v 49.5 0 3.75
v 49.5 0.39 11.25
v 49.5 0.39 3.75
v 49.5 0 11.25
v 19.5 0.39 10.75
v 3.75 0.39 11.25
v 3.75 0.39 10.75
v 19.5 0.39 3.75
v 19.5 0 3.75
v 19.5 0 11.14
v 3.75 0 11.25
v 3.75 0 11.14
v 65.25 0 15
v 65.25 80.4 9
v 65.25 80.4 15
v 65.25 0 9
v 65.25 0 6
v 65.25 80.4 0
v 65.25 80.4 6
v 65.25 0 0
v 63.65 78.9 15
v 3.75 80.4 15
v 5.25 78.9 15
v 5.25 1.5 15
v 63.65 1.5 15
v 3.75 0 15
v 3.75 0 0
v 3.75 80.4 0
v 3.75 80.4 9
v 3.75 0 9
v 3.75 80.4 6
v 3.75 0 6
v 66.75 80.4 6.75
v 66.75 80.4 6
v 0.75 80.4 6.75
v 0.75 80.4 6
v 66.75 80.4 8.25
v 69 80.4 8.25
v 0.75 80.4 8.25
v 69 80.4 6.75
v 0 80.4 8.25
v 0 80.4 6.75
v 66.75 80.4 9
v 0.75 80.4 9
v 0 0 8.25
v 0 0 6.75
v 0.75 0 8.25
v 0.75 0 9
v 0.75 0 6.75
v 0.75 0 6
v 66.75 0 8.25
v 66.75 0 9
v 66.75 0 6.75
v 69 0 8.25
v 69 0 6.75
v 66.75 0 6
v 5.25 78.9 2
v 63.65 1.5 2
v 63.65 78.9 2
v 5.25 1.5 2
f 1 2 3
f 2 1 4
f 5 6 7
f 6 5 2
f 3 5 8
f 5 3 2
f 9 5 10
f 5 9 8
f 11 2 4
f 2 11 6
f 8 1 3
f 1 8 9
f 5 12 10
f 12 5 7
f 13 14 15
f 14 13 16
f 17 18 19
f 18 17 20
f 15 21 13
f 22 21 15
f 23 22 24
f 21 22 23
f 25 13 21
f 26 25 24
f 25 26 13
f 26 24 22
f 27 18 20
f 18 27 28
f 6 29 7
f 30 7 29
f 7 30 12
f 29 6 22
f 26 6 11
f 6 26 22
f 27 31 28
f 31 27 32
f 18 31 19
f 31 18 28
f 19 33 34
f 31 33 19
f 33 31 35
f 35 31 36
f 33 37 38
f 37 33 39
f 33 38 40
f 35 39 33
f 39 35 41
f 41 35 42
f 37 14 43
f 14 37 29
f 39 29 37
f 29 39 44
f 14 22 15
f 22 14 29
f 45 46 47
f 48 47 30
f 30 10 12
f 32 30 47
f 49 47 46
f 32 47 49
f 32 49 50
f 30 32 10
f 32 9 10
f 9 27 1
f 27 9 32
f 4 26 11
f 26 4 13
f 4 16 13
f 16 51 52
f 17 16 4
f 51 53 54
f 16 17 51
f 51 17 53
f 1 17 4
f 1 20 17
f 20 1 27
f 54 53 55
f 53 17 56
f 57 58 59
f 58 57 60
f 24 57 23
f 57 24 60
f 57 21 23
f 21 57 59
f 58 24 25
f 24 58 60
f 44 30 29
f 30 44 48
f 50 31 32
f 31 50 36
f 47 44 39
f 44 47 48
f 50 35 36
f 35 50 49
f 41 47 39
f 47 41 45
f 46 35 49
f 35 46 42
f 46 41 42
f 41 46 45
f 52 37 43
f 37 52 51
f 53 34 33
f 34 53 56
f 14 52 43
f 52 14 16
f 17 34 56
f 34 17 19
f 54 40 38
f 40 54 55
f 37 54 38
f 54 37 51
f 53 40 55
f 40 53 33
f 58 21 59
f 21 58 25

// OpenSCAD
// file: libs/microscope-slide-hyperobject/slide.scad
// ----------------------------------------------------
// Material Hyperobject Compensations
// (Passed dynamically by the Commons API)
// ----------------------------------------------------
mat_shrinkage_x = 1.0;
mat_shrinkage_y = 1.0;
mat_shrinkage_z = 1.0;

mat_clear_press = 0.0;
mat_clear_slide = 0.0;
mat_clear_loose = 0.0;

// Standard Microscope Slide Dimensions (ISO 8037)
function slide_slot_width(thickness, tolerance) = thickness + tolerance + mat_clear_slide + 0.1;
function slide_pitch(slot_w, rib_w) = slot_w + rib_w;

module slide_retention_rib(height, depth, root_w, tip_w, chamfer_h) {
  // ONE polyhedron, not a cube unioned with a chamfer cap.
  //
  // The rib used to be `cube([root_w, depth, height - chamfer_h])` unioned with
  // a polyhedron frustum that started at exactly z = height - chamfer_h. That
  // is a zero-overlap coincident-face union: the two solids share an exact
  // plane and touch on it rather than interpenetrating. CGAL resolves it, but
  // OpenSCAD's Manifold backend -- which is what the platform and
  // `y4d-spec check --render` both use -- snaps near-coincident vertices and
  // tears the pair apart at that plane. Three or more ribs in one array was
  // enough: a 4-rib array came out as 8 shells, not watertight, and a 20-slot
  // box_base as 119 bodies with 26 of them negative.
  //
  // Written as a single closed polyhedron there is no interface plane at all,
  // so there is nothing to tear. Faces are wound CLOCKWISE seen from outside,
  // which is what OpenSCAD wants (the opposite of a CadQuery Shell); wound the
  // other way it renders NoError but inside-out.
  //
  // Volume and extents are unchanged to 3 decimal places; only the redundant
  // interface faces go away (28 -> 20 facets per rib).
  _ch = min(chamfer_h, height);
  _bz = height - _ch;
  _lo = (root_w - tip_w) / 2;
  _hi = (root_w + tip_w) / 2;
  polyhedron(
    points=[
      // 0-3: base, z = 0
      [0, 0, 0], [root_w, 0, 0], [root_w, depth, 0], [0, depth, 0],
      // 4-7: chamfer start, z = height - chamfer_h
      [0, 0, _bz], [root_w, 0, _bz], [root_w, depth, _bz], [0, depth, _bz],
      // 8-11: tip, z = height
      [_lo, 0, height], [_hi, 0, height], [_hi, depth, height], [_lo, depth, height],
    ],
    faces=[
      [0, 1, 2, 3],                                        // base
      [8, 9, 10, 11],                                      // tip
      [0, 4, 5, 1], [1, 5, 6, 2], [2, 6, 7, 3], [3, 7, 4, 0],       // prism sides
      [4, 8, 9, 5], [5, 9, 10, 6], [6, 10, 11, 7], [7, 11, 8, 4],   // chamfer sides
    ]
  );
}

module slide_slot_array(count, pitch, height, depth, root_w, tip_w, chamfer_h, tapered) {
  for (i = [0:count]) {
    translate([i * pitch, 0, 0])
      slide_retention_rib(height, depth, root_w, tip_w, chamfer_h);
  }
}

// ----------------------------------------------------
// ISO 8037-1 Bounded 4D Geometry
// ----------------------------------------------------

module iso_8037_slide(length, width, thickness) {
  // A standard microscope slide volumetric cartridge.
  // Glass usually has polished or ground edges.
  cube([length, width, thickness], center=true);
}

// ----------------------------------------------------
// Cartridge Execution Logic (Triggered by Manifest)
// ----------------------------------------------------

slide_standard = 0; // [0:ISO 8037-1 Primary, 1:ISO 8037-1 Alternate, 2:ISO 8255 #1.5H Cover, 3:ISO 8255 #1 Cover, 4:Custom]
custom_slide_length = 76.0;
custom_slide_width = 26.0;
custom_slide_thickness = 1.0;

render_mode = 0; // [0:main]

if (render_mode == 0) {
  // Material simulation logic for transparency via OpenSCAD nightly alpha
  color([0.8, 0.9, 0.9, 0.4]) {
    // Apply Material Hyperobject Shrinkage Compensation
    scale([mat_shrinkage_x, mat_shrinkage_y, mat_shrinkage_z]) {
      if (slide_standard == 0) {
        // ISO 8037-1 Primary
        iso_8037_slide(76.0, 26.0, 1.0);
      } else if (slide_standard == 1) {
        // ISO 8037-1 Alternate
        iso_8037_slide(75.0, 25.0, 1.0);
      } else if (slide_standard == 2) {
        // ISO 8255 #1.5H Cover Glass
        iso_8037_slide(22.0, 22.0, 0.17);
      } else if (slide_standard == 3) {
        // ISO 8255 #1 Cover Glass
        iso_8037_slide(22.0, 22.0, 0.15);
      } else if (slide_standard == 4) {
        // Custom Geometry
        iso_8037_slide(custom_slide_length, custom_slide_width, custom_slide_thickness);
      }
    }
  }
}
// main file
// ============================================================================
// cabinet_drawer.scad — Class IV: High-Density Archival Cabinet
// ============================================================================
// Reference: docs/RESEARCH.pdf §7 (High-Density Archival Systems)
//
// Sliding drawer with vertical slots inside a stackable shell. T-slot or
// L-rail profiles guide drawer insertion. Shell units interlock vertically
// with trapezoidal dovetail tabs.
//
// Parts:
//   render_mode 0 → drawer  (slide-holding tray that slides into shell)
//   render_mode 1 → shell   (outer housing with rail guides + stack tabs)
// ============================================================================

use <slide_lib.scad>

// ---------------------------------------------------------------------------
// Parameters (injected by platform via -D)
// ---------------------------------------------------------------------------

// --- Slide Standard ---
slide_standard = 0; // 0=ISO, 1=US, 2=Petrographic, 3=Supa Mega, 4=Custom
custom_slide_length = 76;
custom_slide_width = 26;
custom_slide_thickness = 1.0;

// Every additive join in this file penetrates its neighbour by this much, so
// the union is a volumetric fuse rather than a coincident-face kiss. Manifold
// tears the latter apart. 0.1 mm is far below any print resolution and leaves
// the part's extents unchanged.
RAIL_BITE = 0.1;

// --- Architecture ---
num_slots = 25; // Number of slide positions per drawer
density = 0; // 0=archival, 1=working, 2=staining, 3=mailer

// --- Tolerances ---
tolerance_xy = 0.4; // XY clearance (mm)
tolerance_z = 0.2; // Z / thickness clearance (mm)

// --- Structure ---
wall_thickness = 2.4; // Outer wall thickness (mm) — RESEARCH §7.3 min 2.4
floor_thickness = 2.0; // Floor thickness (mm)

// --- Cabinet-specific ---
rail_profile = 0; // 0=t_slot, 1=l_rail
backstop = 1; // 1=flexible tab prevents full extraction
drawers_per_shell = 5; // Number of drawer slots in shell

// --- Features ---
label_area = 1; // 1=generate debossed label recess

// --- Quality ---
fn = 0; // Resolution ($fn), 0 = auto

// --- Mode ---
render_mode = 0; // 0=drawer, 1=shell

// ---------------------------------------------------------------------------
// Resolution
// ---------------------------------------------------------------------------
$fn = fn > 0 ? fn : 32;

// ---------------------------------------------------------------------------
// Resolve Slide Dimensions
// ---------------------------------------------------------------------------
_slide = resolve_slide(
  slide_standard, custom_slide_length,
  custom_slide_width, custom_slide_thickness
);
_sl = _slide[0]; // slide length
_sw = _slide[1]; // slide width
_st = _slide[2]; // slide thickness

// ---------------------------------------------------------------------------
// Derived Dimensions (RESEARCH §7)
// ---------------------------------------------------------------------------
_rib_w = density_rib_width(density);
_slot_w = slot_width(_st, tolerance_z);
_pitch = pitch(_slot_w, _rib_w);

// Drawer slot depth: slides sit half-width deep
_slot_depth = _sw * 0.5;
_rib_height = _slot_depth;

// Drawer envelope
_drawer_x = (num_slots * _pitch) + _rib_w + (2 * 1.5); // 1.5mm thin walls
_drawer_y = _sl + tolerance_xy + 4; // slide length + front/back walls
_drawer_z = _rib_height + floor_thickness;

// Rail dimensions
_rail_h = 3.0; // rail height
_rail_w = 3.0; // rail width (T-slot head or L-rail shelf)
_rail_stem = 1.5; // T-slot stem width
_rail_clearance = tolerance_xy + 0.1; // RESEARCH §7.2 extra clearance

// Shell envelope (houses multiple drawers)
_shell_wall = wall_thickness;
_drawer_gap = 1.0; // clearance between drawer and shell
_slot_h = _drawer_z + _drawer_gap + _rail_h;
// Shell X must encompass drawer + rails on each side + gaps + walls
_shell_x = _drawer_x + 2 * (_rail_w + _drawer_gap) + 2 * _shell_wall;
_shell_y = _drawer_y + _shell_wall + _drawer_gap + 5; // extra at back for backstop
_shell_z = (drawers_per_shell * _slot_h) + _shell_wall * 2;

// Stack tab (RESEARCH §7.1)
_tab_base = 15;
_tab_top = 10;
_tab_h = 4;
_tab_depth = 8;
_tab_y = (_shell_y - _tab_depth) / 2;

// Backstop tab
_backstop_w = 10;
_backstop_h = _drawer_z * 0.6;
_backstop_t = 1.5;

// ---------------------------------------------------------------------------
// drawer — Slide-holding tray with rail flanges
// ---------------------------------------------------------------------------
module drawer() {
  // Shift to positive coordinates (compensate for left rail protrusion)
  // Left rail extent: -_rail_w (3.0) + head offset (-0.75) = -3.75
  translate([_rail_w + (_rail_w - _rail_stem) / 2, 0, 0]) {
    union() {
      // Base trough
      difference() {
        cube([_drawer_x, _drawer_y, _drawer_z]);

        // Hollow interior for slots
        translate([1.5, 1.5, floor_thickness])
          cube(
            [
              _drawer_x - 3,
              _drawer_y - 3,
              _rib_height + 1,
            ]
          );

        // Front label recess
        if (label_area == 1) {
          _label_w = min(30, _drawer_x * 0.5);
          _label_h = min(8, _drawer_z * 0.5);
          translate([(_drawer_x - _label_w) / 2, -0.01, (_drawer_z - _label_h) / 2])
            rotate([90, 0, 0])
              translate([0, 0, -0.4])
                label_recess(_label_w, _label_h, 0.5);
        }
      }

      // Rib array.
      //
      // Three coincident faces, all of them slivers in the export:
      //  * the ribs sat exactly ON the trough floor plane (z = floor_thickness),
      //  * their two ends sat exactly on the trough's front and back walls
      //    (y = 1.5 and y = 78.9, which is precisely the interior cut's span),
      //  * and the array runs to x = 60.0, which is exactly the interior cut's
      //    far wall, so the last rib's outer face was coplanar with it. (N slots
      //    genuinely need N+1 ribs -- a slot is the gap BETWEEN two ribs -- and
      //    the trough is sized `num_slots * pitch + rib_w` wide, so the last rib
      //    landing on the wall is by design, not an off-by-one.)
      // Manifold tore each of those into a zero-volume 2-face shell; the drawer
      // exported as 4 bodies, 3 of them degenerate, and not watertight.
      //
      // The ribs now sink RAIL_BITE into the floor and overrun the front and
      // back walls by RAIL_BITE at each end. Rib WIDTHS and PITCH are untouched
      // -- they set the slot the glass sits in -- so the far-wall coincidence is
      // closed by a separate filler block below rather than by fattening ribs.
      translate([1.5, 1.5 - RAIL_BITE, floor_thickness - RAIL_BITE]) {
        slot_array(
          count=num_slots,
          pitch=_pitch,
          height=_rib_height + RAIL_BITE,
          depth=_drawer_y - 3 + 2 * RAIL_BITE,
          root_w=_rib_w,
          tip_w=_rib_w * 0.7,
          chamfer_h=min(1.5, _rib_height * 0.1),
          tapered=true
        );
      }

      // The last rib's outer face lands exactly on the trough's far wall.
      // A thin filler spanning that plane turns the kiss into a fuse without
      // touching any rib's width or the slot pitch.
      translate([1.5 + num_slots * _pitch + _rib_w - RAIL_BITE,
                 1.5 - RAIL_BITE,
                 floor_thickness - RAIL_BITE])
        cube([2 * RAIL_BITE,
              _drawer_y - 3 + 2 * RAIL_BITE,
              _rib_height + RAIL_BITE]);

      // Rail flanges along drawer sides.
      //
      // Every one of these met the drawer body (and the T-slot's own stem met
      // its head and its bridge) on an EXACT plane -- a zero-overlap kiss.
      // Manifold, the backend the platform and `y4d-spec check --render` both
      // use, snaps near-coincident vertices and tears such a pair apart; the
      // drawer came out as 4 shells, not watertight, with the rails detached.
      //
      // Each rail now penetrates the body by RAIL_BITE and the T-slot's parts
      // overlap each other by the same amount, so every join is a volumetric
      // fuse. The rails' OUTER faces are untouched -- they are the running
      // surfaces that mate with the shell's channels, so their positions and
      // the drawer's overall extents are unchanged.
      if (rail_profile == 0) {
        // T-slot: stem + head
        // Left rail
        translate([-_rail_w, 0, _drawer_z / 2 - _rail_h / 2]) {
          // Stem, carried RAIL_BITE into the body (was flush at x = _rail_w).
          cube([_rail_stem + RAIL_BITE, _drawer_y, _rail_h]);
          // Head, overlapping the stem rather than abutting it.
          translate([-(_rail_w - _rail_stem) / 2, 0, _rail_h * 0.25])
            cube([_rail_w + RAIL_BITE, _drawer_y, _rail_h * 0.5]);

          // Bridge from the stem to the body: starts RAIL_BITE back inside the
          // stem and ends RAIL_BITE inside the body.
          translate([_rail_stem - RAIL_BITE, 0, 0])
            cube([_rail_w - _rail_stem + 2 * RAIL_BITE, _drawer_y, _rail_h]);
        }
        // Right rail. The stem starts RAIL_BITE inside the body and keeps its
        // original outer face, so the drawer's overall width is unchanged.
        translate([_drawer_x - RAIL_BITE, 0, _drawer_z / 2 - _rail_h / 2]) {
          cube([_rail_stem + RAIL_BITE, _drawer_y, _rail_h]);
          translate([_rail_stem - (_rail_w - _rail_stem) / 2,
                     0, _rail_h * 0.25])
            cube([_rail_w + RAIL_BITE, _drawer_y, _rail_h * 0.5]);
        }
      } else {
        // L-rail: simple shelf, each biting RAIL_BITE into the body.
        // Left rail
        translate([-_rail_w, 0, 0])
          cube([_rail_w + RAIL_BITE, _drawer_y, _rail_h]);
        // Right rail
        translate([_drawer_x - RAIL_BITE, 0, 0])
          cube([_rail_w + RAIL_BITE, _drawer_y, _rail_h]);
      }
    }
  }
}

// ---------------------------------------------------------------------------
// shell — Outer housing with rail channels and stack tabs
// ---------------------------------------------------------------------------
module shell() {
  // Position of drawer within shell
  _dx = _shell_wall + _drawer_gap + _rail_w;

  union() {
    difference() {
      // Outer box
      cube([_shell_x, _shell_y, _shell_z]);

      // Drawer slot cavities
      for (d = [0:drawers_per_shell - 1]) {
        _dz = _shell_wall + d * _slot_h;

        // Main drawer cavity (open at front)
        translate([_dx - _drawer_gap, -0.01, _dz])
          cube(
            [
              _drawer_x + _drawer_gap * 2,
              _drawer_y + _drawer_gap,
              _drawer_z + _drawer_gap,
            ]
          );

        // Rail channels
        if (rail_profile == 0) {
          // T-slot channels
          // Left channel
          translate([_dx - _rail_w - _rail_clearance - _drawer_gap, -0.01, _dz + _drawer_z / 2 - _rail_h / 2 - _rail_clearance / 2]) {
            cube([_rail_stem + _rail_clearance, _shell_y + 0.02, _rail_h + _rail_clearance]);
            translate([-(_rail_w - _rail_stem) / 2 - _rail_clearance / 2, 0, _rail_h * 0.25 - _rail_clearance / 2])
              cube([_rail_w + _rail_clearance, _shell_y + 0.02, _rail_h * 0.5 + _rail_clearance]);
          }
          // Right channel
          translate([_dx + _drawer_x + _drawer_gap, -0.01, _dz + _drawer_z / 2 - _rail_h / 2 - _rail_clearance / 2]) {
            cube([_rail_stem + _rail_clearance, _shell_y + 0.02, _rail_h + _rail_clearance]);
            translate([_rail_stem - (_rail_w - _rail_stem) / 2, 0, _rail_h * 0.25 - _rail_clearance / 2])
              cube([_rail_w + _rail_clearance, _shell_y + 0.02, _rail_h * 0.5 + _rail_clearance]);
          }
        } else {
          // L-rail channels
          translate([_dx - _rail_w - _rail_clearance - _drawer_gap, -0.01, _dz - _rail_clearance / 2])
            cube([_rail_w + _rail_clearance, _shell_y + 0.02, _rail_h + _rail_clearance]);
          translate([_dx + _drawer_x + _drawer_gap, -0.01, _dz - _rail_clearance / 2])
            cube([_rail_w + _rail_clearance, _shell_y + 0.02, _rail_h + _rail_clearance]);
        }
      }

      // Female stack tab recesses on bottom
      translate([_shell_x * 0.25 - _tab_base / 2 - 0.2, _tab_y - 0.2, -0.01])
        stack_tab_female(_tab_base, _tab_top, _tab_h, _tab_depth);
      translate([_shell_x * 0.75 - _tab_base / 2 - 0.2, _tab_y - 0.2, -0.01])
        stack_tab_female(_tab_base, _tab_top, _tab_h, _tab_depth);

      // Label area on shell front (one per drawer slot)
      if (label_area == 1) {
        for (d = [0:drawers_per_shell - 1]) {
          _dz = _shell_wall + d * _slot_h;
          _label_w = min(25, _shell_x * 0.3);
          _label_h = min(6, _slot_h * 0.3);
          translate([(_shell_x - _label_w) / 2, -0.01, _dz + (_slot_h - _label_h) / 2])
            rotate([90, 0, 0])
              translate([0, 0, -0.4])
                label_recess(_label_w, _label_h, 0.5);
        }
      }
    }

    // Backstop tabs at rear (one per drawer slot)
    if (backstop == 1) {
      for (d = [0:drawers_per_shell - 1]) {
        _dz = _shell_wall + d * _slot_h;
        translate(
          [
            _shell_x / 2 - _backstop_w / 2,
            _shell_y - _shell_wall - _backstop_t,
            _dz,
          ]
        )
          cube([_backstop_w, _backstop_t, _backstop_h]);
      }
    }

    // Stack tabs — male on top
    translate([_shell_x * 0.25 - _tab_base / 2, _tab_y, _shell_z])
      stack_tab_male(_tab_base, _tab_top, _tab_h, _tab_depth);
    translate([_shell_x * 0.75 - _tab_base / 2, _tab_y, _shell_z])
      stack_tab_male(_tab_base, _tab_top, _tab_h, _tab_depth);
  }
}

// ---------------------------------------------------------------------------
// Render Mode Dispatch
// ---------------------------------------------------------------------------
if (render_mode == 0) {
  drawer();
}

if (render_mode == 1) {
  shell();
}
